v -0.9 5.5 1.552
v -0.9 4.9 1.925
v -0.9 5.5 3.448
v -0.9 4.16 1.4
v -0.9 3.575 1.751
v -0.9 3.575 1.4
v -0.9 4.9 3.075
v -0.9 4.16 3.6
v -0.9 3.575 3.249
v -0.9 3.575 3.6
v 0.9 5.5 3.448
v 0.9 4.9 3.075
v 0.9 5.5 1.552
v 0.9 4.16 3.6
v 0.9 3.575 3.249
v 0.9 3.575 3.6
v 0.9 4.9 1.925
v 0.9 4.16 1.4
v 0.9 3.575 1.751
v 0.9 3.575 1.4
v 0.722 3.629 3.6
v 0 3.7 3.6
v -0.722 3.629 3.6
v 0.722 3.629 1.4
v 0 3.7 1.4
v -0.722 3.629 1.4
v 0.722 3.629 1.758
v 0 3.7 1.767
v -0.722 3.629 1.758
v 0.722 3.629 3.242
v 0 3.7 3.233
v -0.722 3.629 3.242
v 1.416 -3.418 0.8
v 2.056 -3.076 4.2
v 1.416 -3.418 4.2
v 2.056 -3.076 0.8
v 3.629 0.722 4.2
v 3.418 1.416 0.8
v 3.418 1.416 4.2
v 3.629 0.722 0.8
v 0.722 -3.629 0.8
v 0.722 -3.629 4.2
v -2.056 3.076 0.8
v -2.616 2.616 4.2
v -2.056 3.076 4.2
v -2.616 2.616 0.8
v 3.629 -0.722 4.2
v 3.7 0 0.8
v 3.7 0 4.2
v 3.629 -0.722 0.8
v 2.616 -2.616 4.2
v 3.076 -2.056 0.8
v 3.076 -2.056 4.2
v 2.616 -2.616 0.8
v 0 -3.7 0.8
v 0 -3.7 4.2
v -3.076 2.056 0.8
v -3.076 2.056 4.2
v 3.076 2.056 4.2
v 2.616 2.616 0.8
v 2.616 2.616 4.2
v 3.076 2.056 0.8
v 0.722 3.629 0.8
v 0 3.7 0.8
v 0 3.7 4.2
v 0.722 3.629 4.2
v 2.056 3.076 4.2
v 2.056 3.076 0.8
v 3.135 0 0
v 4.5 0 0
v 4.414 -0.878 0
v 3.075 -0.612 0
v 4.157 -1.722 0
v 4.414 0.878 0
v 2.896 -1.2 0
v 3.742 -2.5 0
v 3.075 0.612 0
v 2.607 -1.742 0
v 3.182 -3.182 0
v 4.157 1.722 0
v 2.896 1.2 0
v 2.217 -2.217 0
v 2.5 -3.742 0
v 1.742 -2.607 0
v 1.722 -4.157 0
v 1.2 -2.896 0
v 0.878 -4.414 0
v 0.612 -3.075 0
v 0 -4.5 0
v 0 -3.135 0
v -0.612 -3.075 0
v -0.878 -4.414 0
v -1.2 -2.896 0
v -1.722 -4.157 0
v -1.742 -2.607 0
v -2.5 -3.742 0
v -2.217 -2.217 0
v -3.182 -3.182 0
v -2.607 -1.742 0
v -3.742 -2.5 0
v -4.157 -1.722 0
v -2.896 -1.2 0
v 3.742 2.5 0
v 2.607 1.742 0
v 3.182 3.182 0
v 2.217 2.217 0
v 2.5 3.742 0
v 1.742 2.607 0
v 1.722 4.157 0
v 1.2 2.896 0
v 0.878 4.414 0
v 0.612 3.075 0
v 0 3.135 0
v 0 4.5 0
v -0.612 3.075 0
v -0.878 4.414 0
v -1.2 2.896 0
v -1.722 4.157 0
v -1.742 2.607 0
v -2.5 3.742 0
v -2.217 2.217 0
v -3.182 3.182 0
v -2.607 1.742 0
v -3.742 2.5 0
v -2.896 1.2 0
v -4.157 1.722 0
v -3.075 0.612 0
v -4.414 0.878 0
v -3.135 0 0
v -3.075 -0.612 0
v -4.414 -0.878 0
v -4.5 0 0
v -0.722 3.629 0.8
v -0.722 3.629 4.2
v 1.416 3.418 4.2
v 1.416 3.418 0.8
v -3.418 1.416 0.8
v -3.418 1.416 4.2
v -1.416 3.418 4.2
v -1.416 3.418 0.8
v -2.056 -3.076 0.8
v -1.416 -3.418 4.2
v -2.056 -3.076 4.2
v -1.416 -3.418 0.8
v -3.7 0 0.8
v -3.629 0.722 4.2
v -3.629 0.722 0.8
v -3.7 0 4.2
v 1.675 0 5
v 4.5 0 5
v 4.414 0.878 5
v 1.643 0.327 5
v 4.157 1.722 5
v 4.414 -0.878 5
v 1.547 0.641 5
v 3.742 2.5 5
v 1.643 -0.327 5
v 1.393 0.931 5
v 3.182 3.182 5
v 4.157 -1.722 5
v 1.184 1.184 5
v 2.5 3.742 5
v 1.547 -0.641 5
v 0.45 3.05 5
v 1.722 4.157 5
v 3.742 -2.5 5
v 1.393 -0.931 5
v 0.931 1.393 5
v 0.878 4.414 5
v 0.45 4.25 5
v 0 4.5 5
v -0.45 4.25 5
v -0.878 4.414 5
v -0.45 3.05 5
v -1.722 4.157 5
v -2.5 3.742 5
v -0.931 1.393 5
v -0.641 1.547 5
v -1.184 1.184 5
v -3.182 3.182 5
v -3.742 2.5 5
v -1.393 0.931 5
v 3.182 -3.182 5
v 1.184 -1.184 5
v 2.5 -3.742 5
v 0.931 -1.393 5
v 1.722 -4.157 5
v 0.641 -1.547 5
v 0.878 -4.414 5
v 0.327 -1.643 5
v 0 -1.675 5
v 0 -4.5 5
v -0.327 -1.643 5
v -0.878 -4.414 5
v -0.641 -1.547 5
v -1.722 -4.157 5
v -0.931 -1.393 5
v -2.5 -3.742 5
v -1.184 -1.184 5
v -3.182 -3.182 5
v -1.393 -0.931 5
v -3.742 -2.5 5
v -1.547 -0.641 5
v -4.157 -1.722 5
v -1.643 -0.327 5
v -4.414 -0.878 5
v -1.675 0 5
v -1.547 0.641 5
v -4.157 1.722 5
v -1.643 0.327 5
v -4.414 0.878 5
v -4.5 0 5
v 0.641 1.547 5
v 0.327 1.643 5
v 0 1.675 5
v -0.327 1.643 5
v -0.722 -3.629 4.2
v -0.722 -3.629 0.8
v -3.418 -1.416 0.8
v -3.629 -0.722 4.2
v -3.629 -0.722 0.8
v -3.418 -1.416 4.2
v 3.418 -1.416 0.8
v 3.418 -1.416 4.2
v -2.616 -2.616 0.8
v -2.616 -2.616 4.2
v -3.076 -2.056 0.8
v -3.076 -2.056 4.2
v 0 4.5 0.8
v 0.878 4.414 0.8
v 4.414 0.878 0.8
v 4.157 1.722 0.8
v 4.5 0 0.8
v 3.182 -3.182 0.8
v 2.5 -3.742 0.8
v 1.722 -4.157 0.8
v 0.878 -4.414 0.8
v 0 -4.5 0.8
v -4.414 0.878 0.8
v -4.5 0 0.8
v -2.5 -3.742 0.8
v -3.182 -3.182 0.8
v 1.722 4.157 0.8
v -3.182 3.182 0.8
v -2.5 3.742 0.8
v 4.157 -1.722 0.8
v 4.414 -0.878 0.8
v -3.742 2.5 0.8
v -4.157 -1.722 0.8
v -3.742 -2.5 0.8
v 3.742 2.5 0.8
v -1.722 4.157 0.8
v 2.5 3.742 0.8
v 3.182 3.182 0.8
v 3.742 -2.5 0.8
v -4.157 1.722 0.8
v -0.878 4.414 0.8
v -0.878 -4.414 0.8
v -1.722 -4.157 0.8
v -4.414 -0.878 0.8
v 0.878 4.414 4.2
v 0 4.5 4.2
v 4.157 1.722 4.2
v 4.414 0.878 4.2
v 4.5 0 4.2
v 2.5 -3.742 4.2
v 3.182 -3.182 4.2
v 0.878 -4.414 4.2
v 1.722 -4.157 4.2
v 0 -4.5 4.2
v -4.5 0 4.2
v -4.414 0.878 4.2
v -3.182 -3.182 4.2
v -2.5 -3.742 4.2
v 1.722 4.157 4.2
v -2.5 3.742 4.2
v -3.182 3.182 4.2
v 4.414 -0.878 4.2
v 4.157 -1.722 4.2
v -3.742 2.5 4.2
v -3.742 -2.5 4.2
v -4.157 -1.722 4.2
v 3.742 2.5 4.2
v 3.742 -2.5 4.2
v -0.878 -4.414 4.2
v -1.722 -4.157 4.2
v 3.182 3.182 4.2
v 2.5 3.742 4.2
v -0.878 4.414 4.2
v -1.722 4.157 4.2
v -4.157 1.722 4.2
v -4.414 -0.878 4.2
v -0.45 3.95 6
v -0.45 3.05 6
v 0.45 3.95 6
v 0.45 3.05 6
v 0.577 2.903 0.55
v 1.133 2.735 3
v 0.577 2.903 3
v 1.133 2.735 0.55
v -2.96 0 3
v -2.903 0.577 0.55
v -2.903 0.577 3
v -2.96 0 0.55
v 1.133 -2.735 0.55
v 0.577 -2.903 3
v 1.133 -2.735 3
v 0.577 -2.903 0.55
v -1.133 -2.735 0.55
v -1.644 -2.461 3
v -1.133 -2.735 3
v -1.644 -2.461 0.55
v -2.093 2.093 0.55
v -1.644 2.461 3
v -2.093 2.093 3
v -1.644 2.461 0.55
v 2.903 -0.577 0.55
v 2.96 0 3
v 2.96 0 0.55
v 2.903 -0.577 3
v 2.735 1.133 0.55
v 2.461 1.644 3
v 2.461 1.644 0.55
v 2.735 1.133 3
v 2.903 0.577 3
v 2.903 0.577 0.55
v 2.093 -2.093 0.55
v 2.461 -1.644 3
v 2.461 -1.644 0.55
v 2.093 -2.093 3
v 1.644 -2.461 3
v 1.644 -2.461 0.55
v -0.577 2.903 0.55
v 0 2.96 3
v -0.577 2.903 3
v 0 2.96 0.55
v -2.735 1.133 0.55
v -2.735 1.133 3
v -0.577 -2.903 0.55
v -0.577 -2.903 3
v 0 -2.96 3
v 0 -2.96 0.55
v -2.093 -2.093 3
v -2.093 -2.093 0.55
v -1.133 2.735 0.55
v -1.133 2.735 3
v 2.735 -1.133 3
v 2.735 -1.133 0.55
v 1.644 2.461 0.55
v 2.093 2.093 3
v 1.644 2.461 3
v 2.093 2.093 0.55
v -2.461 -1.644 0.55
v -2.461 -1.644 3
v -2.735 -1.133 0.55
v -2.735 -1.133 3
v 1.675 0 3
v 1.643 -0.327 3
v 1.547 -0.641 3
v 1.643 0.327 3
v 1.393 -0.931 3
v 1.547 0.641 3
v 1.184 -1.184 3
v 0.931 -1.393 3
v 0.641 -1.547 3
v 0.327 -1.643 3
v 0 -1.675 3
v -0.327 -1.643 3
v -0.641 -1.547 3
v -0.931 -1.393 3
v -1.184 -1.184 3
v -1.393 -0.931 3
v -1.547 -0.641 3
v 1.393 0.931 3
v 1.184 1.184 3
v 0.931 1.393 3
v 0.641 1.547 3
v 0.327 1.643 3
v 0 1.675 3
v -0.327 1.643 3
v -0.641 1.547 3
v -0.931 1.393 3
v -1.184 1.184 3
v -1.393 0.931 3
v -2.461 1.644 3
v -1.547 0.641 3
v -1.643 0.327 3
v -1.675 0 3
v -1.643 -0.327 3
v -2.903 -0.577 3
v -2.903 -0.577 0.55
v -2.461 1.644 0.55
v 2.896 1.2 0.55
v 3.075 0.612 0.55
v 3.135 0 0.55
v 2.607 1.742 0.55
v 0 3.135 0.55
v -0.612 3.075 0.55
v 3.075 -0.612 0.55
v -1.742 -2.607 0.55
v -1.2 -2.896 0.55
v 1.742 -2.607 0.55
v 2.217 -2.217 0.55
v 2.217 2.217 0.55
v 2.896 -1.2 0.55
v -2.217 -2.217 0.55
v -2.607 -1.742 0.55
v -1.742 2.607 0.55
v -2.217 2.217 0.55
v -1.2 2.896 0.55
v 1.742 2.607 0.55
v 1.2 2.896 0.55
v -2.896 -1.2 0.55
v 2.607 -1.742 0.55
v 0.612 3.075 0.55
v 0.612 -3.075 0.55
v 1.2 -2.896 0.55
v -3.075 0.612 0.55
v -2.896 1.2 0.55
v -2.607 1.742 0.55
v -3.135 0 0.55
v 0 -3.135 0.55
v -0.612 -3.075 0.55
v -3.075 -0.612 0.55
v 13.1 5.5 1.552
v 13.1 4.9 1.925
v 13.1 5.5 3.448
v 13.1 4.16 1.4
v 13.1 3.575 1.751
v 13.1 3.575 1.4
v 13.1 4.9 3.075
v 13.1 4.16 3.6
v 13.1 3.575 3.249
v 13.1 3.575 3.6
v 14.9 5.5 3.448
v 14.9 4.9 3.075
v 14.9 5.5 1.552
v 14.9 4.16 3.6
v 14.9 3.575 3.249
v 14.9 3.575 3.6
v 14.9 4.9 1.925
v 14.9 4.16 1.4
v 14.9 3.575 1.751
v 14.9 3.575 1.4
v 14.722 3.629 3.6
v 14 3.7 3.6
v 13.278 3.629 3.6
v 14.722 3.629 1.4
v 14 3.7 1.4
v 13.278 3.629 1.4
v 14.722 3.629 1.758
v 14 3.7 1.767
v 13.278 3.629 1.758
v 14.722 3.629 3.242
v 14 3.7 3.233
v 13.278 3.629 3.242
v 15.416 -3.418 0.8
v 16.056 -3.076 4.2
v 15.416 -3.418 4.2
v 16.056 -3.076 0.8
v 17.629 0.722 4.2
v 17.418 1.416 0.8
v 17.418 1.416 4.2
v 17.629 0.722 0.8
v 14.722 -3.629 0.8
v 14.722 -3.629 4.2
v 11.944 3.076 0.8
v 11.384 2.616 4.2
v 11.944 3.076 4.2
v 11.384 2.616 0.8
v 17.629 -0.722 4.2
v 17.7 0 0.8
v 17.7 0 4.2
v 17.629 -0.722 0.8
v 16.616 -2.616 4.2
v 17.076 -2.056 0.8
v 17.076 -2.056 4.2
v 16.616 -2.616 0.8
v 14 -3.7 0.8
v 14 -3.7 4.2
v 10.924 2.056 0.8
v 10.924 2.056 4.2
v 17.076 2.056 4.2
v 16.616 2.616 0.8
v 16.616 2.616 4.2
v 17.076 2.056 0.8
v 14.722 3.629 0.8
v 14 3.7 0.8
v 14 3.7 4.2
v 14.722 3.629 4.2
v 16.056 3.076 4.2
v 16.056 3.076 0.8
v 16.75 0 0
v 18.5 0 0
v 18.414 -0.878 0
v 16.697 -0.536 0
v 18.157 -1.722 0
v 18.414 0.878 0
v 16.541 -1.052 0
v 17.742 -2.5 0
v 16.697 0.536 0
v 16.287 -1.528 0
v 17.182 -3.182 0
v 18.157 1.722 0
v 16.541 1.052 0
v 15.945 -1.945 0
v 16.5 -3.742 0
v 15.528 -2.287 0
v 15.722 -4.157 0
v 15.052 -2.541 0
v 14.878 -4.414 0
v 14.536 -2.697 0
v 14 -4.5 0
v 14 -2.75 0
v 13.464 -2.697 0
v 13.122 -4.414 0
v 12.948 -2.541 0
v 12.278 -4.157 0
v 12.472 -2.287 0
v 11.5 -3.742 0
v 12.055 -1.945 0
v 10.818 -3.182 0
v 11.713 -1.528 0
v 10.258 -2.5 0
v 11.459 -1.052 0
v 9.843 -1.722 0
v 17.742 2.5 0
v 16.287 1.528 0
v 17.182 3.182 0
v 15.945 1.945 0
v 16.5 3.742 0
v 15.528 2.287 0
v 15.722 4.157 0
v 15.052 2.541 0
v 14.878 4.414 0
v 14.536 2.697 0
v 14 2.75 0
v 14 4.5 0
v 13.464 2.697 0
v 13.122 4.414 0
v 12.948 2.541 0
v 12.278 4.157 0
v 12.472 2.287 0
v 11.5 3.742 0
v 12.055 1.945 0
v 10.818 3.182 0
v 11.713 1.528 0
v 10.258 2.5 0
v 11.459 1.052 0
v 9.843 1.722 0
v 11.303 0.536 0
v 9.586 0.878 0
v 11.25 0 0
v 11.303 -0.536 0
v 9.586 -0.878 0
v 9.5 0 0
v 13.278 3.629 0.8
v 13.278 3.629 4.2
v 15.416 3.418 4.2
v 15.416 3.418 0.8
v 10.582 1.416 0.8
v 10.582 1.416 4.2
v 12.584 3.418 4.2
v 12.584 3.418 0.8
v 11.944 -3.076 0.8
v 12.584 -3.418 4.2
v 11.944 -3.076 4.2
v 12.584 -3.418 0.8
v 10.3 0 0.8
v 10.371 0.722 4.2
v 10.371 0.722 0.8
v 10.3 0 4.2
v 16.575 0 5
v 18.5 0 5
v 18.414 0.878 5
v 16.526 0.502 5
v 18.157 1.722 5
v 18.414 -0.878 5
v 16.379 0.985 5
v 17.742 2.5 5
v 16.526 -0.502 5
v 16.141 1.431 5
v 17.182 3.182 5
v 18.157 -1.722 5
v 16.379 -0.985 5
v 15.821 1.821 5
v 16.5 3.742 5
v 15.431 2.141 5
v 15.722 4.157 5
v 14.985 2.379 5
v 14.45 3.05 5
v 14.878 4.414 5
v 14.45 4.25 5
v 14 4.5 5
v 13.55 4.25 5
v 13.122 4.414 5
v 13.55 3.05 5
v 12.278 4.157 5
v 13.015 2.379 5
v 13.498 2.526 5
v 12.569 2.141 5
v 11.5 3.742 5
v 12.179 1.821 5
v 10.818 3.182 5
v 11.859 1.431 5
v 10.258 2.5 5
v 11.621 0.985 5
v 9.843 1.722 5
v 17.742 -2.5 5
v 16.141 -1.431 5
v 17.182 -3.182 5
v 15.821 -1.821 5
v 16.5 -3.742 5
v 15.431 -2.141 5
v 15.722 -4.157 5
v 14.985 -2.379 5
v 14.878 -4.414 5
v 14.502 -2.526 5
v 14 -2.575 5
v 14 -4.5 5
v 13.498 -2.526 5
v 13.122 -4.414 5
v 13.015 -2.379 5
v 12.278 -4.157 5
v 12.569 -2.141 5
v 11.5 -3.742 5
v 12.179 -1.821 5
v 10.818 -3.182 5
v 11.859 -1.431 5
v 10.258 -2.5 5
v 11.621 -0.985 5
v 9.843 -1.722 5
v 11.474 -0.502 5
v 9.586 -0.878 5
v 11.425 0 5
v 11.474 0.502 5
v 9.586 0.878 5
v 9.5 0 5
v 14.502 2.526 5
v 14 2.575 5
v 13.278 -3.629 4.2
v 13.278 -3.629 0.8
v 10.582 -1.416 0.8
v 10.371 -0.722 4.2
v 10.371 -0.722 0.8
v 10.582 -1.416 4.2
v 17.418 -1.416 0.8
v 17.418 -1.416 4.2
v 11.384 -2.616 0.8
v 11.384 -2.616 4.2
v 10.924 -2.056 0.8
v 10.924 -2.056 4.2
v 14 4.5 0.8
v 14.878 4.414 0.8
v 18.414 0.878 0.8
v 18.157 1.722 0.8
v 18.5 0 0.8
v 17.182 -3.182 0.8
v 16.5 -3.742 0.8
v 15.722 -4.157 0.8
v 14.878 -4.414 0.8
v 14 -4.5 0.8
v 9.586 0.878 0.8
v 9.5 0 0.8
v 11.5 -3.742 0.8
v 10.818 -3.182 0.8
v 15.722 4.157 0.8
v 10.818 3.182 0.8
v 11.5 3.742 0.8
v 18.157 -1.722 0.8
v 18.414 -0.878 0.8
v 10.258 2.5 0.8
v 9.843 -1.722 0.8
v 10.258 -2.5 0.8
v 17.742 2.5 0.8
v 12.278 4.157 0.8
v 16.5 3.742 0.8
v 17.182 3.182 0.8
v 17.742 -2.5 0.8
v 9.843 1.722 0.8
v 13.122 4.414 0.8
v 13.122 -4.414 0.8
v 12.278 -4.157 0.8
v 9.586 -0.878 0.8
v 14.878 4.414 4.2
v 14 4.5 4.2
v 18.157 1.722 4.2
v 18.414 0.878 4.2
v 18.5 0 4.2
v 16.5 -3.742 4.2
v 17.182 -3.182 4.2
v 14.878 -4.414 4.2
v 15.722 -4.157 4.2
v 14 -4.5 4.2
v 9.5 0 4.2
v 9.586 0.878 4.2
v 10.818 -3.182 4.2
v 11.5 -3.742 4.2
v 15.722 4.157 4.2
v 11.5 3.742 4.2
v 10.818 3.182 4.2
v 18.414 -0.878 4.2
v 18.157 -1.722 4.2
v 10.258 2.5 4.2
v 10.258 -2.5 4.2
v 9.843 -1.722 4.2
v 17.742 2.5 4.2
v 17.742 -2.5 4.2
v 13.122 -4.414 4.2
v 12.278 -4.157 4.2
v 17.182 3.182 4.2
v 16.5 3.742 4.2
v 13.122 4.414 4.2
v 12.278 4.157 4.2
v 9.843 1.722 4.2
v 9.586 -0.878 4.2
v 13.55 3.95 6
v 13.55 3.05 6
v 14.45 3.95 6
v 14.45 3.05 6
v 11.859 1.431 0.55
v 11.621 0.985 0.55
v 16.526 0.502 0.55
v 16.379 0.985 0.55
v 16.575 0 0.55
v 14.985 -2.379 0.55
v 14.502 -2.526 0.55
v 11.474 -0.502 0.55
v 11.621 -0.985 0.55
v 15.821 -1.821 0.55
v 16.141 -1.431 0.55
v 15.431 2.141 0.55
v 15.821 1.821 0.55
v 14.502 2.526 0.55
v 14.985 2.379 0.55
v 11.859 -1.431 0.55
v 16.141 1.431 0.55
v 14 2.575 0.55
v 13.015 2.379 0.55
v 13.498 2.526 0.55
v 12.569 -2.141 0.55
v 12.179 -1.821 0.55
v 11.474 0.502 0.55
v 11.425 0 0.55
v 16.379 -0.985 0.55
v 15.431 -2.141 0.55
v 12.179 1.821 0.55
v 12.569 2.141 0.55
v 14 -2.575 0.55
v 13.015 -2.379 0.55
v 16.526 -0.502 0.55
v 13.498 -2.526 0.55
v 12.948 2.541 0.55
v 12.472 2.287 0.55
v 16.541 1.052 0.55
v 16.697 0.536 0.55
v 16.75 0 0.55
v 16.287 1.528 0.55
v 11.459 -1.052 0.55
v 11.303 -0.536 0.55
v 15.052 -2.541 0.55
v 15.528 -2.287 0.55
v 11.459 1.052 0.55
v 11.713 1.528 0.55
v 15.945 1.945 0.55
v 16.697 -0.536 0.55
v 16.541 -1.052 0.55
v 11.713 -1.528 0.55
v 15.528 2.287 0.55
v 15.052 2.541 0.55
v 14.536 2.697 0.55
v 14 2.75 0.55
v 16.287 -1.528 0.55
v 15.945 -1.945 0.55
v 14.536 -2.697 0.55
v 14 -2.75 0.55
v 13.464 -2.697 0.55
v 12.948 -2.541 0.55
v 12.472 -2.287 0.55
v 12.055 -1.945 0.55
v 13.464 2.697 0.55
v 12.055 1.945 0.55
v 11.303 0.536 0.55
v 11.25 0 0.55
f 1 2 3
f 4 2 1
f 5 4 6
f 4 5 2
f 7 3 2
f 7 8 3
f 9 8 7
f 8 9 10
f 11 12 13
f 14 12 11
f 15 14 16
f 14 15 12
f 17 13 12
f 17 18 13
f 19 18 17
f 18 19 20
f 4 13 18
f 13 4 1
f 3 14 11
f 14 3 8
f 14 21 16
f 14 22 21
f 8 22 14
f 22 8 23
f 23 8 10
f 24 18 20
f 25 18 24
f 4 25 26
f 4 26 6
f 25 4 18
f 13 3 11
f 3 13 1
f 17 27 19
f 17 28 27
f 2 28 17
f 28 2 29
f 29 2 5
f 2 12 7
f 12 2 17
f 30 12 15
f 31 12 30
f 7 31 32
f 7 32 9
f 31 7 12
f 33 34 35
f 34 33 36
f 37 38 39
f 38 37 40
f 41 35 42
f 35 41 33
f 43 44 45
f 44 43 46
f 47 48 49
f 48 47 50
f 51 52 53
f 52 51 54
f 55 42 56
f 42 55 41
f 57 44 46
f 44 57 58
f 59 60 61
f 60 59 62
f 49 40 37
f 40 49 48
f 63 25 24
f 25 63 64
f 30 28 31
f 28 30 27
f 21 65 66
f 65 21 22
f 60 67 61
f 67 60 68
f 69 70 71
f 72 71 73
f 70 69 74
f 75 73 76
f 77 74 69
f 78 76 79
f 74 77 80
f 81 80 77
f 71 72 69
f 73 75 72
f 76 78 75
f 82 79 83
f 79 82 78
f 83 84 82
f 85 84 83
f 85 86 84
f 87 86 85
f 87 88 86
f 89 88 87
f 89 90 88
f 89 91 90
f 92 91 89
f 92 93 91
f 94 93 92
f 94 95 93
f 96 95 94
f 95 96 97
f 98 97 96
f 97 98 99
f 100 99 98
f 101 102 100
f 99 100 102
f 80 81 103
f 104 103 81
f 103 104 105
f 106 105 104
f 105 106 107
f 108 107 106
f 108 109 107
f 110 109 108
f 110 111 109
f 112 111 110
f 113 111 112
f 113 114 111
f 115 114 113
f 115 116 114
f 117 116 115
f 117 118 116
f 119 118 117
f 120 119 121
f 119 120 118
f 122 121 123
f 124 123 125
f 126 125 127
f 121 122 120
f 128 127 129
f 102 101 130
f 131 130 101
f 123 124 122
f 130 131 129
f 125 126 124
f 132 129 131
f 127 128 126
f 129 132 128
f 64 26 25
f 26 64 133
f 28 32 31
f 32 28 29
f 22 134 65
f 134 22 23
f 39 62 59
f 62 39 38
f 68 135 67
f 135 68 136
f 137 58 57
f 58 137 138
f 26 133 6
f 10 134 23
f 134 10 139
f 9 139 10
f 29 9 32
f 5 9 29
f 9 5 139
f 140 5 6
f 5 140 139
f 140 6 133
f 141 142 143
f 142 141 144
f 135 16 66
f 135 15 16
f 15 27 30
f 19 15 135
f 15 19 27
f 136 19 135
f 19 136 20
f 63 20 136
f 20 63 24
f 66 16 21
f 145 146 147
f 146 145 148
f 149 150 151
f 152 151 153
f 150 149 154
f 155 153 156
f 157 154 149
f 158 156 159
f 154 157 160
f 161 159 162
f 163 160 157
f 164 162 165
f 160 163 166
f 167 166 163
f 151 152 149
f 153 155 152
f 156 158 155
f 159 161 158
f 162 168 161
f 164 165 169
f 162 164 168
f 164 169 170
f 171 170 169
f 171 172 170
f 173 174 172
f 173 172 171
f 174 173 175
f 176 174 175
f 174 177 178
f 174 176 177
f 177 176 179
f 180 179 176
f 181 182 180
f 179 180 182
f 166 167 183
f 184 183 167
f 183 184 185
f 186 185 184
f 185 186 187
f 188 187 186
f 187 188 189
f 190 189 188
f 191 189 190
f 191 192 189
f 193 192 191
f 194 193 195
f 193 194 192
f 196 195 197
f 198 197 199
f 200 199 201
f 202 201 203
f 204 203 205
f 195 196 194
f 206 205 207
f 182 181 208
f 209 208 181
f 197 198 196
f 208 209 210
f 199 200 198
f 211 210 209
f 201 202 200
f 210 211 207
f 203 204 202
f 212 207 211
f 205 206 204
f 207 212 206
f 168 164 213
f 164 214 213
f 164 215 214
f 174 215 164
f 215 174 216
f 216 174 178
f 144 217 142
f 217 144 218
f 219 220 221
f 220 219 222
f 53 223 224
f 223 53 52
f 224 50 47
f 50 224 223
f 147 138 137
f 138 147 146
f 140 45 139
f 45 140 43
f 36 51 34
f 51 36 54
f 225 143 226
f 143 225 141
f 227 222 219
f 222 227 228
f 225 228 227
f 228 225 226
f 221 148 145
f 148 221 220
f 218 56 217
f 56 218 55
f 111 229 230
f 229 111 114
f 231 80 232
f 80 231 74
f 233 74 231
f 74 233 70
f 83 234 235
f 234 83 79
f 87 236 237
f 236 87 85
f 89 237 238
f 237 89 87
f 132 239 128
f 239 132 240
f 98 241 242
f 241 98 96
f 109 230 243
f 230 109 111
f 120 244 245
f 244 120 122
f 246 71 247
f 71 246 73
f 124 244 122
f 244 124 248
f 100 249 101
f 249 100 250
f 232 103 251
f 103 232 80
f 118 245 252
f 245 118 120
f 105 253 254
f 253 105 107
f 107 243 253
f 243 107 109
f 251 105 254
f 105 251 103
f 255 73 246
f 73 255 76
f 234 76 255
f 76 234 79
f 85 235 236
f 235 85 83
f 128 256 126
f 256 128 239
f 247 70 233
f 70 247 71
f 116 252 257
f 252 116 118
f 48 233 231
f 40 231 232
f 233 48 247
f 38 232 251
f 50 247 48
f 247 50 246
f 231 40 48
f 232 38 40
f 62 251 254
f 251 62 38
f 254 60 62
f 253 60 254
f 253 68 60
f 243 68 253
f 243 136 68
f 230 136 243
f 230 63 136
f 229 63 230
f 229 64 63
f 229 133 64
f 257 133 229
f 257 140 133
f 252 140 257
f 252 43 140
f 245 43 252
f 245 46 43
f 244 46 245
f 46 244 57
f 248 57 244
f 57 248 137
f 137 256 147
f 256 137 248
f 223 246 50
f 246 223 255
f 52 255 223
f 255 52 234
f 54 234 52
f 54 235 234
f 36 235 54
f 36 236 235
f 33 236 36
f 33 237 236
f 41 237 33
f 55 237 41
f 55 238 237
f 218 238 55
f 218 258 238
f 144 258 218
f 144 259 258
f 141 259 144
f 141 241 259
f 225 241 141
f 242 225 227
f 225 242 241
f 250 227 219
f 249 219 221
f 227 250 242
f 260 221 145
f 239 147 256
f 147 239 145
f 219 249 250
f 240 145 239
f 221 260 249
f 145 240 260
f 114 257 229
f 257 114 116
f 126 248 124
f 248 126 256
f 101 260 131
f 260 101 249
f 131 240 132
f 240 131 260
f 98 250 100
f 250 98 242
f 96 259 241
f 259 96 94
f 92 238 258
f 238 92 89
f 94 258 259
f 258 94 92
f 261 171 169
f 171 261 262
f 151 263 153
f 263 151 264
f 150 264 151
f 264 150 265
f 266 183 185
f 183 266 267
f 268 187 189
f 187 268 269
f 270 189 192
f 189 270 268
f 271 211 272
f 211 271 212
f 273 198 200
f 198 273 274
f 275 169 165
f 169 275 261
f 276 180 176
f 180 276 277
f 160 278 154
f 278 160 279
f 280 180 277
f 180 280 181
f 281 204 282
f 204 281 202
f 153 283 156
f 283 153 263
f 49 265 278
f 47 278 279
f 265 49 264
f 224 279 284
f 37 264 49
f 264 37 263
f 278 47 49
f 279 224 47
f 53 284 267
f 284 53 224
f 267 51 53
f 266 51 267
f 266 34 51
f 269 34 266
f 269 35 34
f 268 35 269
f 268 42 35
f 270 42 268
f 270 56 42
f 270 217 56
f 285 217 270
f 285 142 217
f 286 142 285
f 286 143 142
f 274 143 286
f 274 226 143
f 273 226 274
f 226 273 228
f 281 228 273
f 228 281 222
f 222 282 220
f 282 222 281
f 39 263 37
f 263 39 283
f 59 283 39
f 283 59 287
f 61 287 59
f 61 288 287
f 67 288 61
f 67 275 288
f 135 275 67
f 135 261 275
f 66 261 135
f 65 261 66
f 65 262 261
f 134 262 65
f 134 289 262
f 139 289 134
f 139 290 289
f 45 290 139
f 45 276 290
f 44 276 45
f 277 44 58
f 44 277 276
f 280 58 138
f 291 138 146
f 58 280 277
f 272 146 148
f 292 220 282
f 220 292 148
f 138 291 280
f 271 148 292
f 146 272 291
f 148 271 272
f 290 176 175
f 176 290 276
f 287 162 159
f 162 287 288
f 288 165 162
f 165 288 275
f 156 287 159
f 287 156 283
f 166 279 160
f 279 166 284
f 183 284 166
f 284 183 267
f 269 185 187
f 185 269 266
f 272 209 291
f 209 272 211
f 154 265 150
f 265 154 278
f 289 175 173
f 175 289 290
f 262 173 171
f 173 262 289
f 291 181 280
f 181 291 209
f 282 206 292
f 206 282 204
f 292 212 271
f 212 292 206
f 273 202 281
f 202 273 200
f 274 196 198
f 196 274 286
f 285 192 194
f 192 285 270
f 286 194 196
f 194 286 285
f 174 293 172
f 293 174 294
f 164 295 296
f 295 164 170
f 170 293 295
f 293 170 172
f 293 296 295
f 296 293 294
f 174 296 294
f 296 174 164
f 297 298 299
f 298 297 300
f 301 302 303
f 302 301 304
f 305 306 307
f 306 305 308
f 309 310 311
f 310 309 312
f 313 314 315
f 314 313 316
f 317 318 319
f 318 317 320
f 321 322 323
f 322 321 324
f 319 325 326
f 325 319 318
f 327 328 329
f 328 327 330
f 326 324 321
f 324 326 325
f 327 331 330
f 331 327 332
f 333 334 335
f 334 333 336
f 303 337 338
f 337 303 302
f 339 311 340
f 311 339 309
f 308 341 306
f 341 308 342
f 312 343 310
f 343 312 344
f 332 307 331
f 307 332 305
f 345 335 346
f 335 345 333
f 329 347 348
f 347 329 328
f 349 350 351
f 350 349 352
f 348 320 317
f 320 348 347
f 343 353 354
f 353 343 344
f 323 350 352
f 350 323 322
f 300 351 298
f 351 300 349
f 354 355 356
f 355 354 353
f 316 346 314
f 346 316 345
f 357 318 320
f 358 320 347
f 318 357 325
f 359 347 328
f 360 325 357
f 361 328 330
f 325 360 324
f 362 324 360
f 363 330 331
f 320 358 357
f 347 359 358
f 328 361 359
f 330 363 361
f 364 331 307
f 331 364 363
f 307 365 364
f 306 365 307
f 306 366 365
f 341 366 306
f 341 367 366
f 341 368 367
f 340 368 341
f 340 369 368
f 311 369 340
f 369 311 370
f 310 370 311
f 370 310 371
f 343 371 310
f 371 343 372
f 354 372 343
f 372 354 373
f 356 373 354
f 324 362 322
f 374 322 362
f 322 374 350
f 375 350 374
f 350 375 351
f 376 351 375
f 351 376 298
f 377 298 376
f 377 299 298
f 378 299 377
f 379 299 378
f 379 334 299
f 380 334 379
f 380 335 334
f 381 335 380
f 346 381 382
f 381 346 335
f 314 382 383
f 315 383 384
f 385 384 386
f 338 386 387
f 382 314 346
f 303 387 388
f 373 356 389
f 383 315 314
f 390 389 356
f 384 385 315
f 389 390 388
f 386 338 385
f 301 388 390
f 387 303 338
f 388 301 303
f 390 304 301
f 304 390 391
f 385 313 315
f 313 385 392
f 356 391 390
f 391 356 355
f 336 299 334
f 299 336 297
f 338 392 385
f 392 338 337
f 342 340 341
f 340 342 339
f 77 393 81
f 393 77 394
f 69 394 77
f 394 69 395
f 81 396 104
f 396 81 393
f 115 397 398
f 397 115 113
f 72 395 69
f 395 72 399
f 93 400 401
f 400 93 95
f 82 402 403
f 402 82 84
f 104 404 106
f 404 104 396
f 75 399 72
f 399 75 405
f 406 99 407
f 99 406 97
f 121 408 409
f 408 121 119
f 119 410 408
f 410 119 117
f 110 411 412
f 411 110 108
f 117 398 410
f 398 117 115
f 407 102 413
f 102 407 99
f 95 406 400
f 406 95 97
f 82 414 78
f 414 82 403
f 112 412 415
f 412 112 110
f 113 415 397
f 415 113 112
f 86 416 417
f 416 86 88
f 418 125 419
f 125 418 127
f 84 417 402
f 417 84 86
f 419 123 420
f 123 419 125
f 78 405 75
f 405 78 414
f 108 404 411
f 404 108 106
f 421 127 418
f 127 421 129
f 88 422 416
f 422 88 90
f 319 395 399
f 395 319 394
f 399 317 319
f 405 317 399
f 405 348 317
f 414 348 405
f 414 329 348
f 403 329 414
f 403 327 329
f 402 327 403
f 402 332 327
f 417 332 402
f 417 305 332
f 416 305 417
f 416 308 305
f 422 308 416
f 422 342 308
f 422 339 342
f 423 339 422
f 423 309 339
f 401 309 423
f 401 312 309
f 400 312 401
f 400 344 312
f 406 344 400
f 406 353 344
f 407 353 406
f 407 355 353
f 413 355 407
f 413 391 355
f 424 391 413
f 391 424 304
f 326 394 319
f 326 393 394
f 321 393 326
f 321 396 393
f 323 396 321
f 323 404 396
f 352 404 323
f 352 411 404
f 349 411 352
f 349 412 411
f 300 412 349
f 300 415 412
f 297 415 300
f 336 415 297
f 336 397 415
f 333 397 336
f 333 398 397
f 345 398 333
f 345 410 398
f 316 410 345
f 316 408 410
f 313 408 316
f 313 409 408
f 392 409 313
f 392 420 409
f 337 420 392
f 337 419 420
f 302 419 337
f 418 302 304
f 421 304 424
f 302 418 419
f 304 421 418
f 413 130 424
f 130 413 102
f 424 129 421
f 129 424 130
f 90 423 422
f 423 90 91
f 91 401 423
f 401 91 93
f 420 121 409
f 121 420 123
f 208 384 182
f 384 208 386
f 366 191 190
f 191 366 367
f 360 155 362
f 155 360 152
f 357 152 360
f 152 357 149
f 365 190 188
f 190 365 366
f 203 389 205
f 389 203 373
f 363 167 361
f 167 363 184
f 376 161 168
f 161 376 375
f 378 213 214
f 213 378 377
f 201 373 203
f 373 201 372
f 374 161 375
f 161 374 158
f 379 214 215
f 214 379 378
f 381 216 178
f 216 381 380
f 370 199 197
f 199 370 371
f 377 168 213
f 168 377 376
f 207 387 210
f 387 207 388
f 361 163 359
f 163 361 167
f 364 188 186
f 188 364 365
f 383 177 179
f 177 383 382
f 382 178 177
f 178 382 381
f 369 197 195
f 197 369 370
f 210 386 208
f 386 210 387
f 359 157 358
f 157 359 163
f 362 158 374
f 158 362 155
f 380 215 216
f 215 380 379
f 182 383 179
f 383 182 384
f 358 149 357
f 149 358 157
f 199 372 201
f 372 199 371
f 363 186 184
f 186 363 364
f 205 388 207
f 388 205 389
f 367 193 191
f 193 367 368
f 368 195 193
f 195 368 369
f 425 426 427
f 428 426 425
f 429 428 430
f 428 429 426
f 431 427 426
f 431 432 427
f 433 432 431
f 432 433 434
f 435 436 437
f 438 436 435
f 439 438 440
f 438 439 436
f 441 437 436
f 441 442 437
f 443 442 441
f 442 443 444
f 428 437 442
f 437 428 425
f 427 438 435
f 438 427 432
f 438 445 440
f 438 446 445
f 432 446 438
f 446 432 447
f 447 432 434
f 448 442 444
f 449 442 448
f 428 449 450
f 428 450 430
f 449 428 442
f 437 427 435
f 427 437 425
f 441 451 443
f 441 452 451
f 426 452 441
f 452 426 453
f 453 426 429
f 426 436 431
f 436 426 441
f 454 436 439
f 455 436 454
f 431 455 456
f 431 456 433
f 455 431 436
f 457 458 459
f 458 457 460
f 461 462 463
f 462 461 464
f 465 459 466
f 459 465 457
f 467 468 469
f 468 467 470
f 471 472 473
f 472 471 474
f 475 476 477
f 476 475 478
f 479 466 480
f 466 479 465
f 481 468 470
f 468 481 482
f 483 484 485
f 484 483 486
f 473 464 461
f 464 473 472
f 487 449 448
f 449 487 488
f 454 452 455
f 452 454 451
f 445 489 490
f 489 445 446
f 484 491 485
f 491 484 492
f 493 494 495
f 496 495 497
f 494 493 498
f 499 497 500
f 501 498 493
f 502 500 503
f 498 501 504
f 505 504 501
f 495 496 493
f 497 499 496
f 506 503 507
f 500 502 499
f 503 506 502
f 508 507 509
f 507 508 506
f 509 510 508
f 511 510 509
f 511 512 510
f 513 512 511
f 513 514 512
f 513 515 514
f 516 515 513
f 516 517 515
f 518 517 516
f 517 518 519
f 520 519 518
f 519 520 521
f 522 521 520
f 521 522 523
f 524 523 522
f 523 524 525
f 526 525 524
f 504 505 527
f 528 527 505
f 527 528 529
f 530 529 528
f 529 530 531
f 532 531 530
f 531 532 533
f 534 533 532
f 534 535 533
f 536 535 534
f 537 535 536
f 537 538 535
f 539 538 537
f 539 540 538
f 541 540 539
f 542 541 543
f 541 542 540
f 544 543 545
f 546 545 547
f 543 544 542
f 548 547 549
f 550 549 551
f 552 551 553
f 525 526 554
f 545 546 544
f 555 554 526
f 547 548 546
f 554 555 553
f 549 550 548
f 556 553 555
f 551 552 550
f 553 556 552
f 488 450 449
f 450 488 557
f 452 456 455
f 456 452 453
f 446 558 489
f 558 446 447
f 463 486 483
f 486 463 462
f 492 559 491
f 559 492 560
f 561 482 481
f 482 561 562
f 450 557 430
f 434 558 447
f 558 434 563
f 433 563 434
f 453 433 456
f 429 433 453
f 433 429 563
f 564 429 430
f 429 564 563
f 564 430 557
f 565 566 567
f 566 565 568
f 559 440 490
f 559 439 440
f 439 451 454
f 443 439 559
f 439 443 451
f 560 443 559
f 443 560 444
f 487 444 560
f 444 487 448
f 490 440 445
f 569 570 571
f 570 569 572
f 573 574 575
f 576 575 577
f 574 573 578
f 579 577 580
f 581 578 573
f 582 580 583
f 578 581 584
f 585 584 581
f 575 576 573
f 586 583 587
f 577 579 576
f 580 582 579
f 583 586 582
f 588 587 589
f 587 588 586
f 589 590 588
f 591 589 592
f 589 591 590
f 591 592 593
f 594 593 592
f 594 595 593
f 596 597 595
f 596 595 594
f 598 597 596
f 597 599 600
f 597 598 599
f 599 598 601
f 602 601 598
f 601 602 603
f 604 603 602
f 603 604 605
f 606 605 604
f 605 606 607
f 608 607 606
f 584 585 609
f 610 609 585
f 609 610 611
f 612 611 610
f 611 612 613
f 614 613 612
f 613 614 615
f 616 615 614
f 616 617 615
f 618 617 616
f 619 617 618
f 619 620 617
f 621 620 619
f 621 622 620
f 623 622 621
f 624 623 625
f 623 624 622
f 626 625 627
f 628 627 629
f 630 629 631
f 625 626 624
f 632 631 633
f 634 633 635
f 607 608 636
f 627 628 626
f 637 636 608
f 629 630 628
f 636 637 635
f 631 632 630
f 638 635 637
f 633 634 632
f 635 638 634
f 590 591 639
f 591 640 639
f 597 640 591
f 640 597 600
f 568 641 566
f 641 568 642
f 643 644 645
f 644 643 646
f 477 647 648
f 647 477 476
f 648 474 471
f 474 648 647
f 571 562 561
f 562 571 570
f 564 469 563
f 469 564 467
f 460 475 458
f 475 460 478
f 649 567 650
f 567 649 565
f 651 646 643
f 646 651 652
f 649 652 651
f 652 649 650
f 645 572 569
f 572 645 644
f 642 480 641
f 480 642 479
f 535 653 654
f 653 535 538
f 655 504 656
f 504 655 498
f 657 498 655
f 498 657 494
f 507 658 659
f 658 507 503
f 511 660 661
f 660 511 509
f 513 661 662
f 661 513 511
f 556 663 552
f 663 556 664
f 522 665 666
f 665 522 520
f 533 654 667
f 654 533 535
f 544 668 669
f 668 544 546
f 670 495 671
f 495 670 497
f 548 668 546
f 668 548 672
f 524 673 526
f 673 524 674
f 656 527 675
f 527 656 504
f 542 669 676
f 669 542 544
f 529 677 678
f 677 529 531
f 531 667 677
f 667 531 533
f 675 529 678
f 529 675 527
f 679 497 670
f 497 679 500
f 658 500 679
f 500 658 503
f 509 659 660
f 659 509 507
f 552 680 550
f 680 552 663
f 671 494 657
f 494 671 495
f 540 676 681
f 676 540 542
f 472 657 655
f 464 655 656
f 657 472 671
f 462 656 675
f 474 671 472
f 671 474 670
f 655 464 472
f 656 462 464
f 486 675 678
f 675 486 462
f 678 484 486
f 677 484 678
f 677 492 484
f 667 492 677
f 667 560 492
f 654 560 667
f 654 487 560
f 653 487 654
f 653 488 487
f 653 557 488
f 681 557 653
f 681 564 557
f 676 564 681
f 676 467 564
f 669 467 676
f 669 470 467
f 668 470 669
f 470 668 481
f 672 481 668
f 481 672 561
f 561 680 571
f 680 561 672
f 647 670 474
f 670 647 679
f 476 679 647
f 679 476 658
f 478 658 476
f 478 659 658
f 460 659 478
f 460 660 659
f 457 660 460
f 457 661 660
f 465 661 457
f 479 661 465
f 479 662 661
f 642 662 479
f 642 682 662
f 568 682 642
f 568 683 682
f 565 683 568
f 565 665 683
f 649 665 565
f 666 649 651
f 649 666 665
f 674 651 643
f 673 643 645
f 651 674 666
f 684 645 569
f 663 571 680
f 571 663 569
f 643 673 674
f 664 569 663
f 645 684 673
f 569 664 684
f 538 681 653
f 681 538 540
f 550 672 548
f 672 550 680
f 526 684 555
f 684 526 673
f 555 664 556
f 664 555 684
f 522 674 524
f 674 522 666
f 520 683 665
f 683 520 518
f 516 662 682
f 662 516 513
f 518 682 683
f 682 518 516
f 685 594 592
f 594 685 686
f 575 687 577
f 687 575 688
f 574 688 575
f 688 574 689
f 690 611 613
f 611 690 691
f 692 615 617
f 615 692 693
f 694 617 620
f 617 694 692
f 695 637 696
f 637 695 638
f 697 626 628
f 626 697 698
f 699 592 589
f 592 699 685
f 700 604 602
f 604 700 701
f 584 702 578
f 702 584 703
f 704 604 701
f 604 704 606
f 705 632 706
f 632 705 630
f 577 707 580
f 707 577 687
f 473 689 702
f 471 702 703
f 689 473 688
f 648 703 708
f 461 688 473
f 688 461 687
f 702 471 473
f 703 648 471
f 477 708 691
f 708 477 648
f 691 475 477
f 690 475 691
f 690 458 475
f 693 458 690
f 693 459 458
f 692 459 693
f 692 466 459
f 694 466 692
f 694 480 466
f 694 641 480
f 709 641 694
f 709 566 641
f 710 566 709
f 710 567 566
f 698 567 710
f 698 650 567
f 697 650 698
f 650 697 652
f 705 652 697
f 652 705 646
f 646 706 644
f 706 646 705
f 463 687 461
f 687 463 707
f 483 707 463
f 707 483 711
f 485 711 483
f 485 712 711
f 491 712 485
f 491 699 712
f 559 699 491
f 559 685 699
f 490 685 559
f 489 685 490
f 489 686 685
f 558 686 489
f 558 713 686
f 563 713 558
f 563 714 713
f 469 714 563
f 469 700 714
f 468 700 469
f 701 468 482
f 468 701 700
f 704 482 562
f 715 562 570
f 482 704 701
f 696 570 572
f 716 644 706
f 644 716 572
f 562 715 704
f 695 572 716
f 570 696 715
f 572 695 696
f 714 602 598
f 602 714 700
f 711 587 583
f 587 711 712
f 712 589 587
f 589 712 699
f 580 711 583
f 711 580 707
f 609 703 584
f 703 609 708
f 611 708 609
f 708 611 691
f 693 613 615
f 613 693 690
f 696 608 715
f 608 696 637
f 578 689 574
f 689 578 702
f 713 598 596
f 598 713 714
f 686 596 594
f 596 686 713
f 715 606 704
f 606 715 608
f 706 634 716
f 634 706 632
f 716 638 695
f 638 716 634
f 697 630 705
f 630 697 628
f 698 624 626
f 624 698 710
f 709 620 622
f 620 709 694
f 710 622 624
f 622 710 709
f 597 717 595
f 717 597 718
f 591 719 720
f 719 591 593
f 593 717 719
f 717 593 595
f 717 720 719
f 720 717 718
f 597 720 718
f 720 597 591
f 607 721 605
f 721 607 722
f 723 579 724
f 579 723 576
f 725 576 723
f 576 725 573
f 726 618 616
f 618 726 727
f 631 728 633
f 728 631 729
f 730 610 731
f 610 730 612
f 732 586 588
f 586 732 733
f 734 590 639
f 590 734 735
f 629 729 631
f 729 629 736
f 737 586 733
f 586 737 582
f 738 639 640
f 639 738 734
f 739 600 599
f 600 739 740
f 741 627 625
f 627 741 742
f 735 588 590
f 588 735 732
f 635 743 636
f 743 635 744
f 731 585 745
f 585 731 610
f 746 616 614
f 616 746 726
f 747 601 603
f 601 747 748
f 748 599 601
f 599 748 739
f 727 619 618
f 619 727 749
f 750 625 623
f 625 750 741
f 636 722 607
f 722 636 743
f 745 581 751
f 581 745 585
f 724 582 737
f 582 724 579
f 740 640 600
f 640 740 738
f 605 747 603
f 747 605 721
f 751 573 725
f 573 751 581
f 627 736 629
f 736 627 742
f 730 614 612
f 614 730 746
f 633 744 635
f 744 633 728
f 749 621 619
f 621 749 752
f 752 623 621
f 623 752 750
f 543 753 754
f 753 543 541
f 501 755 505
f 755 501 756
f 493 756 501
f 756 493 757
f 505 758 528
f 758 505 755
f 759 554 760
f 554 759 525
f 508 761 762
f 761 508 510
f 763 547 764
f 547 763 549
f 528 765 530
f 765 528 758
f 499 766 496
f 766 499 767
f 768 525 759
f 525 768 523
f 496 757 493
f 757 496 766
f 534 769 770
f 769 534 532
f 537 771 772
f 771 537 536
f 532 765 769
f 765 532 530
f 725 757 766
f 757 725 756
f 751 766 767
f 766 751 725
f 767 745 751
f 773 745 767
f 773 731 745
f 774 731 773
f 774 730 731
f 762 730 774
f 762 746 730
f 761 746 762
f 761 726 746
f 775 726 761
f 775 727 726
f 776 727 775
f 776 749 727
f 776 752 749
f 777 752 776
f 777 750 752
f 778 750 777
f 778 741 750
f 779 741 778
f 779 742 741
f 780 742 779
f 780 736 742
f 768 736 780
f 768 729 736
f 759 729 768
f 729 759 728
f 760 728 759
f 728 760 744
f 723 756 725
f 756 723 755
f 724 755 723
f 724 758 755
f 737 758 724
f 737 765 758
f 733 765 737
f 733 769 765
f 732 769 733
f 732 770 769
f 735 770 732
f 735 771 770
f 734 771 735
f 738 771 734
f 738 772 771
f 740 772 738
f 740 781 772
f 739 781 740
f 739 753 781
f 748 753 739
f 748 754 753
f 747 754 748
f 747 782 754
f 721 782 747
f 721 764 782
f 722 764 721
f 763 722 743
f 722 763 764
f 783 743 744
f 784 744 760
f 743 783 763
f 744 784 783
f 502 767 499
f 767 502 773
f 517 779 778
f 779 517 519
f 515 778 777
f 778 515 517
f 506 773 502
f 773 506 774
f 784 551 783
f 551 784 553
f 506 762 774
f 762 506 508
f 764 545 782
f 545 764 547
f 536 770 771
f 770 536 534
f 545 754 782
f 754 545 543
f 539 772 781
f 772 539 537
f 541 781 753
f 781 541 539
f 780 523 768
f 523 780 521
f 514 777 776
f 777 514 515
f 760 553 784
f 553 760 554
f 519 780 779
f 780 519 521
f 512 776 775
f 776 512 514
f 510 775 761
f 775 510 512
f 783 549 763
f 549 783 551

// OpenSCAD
// DOUBLE TAKE FRAMES DESIGN RELEASE
// DTF_RELEASE: 1.0.0
// Released: 2026-08-30
// Versioning: Semantic Versioning 2.0.0 (https://semver.org/)
// Status: CANONICAL
// Changes in 1.0.0:
// - Initial versioned public design release.
// - Establishes the current accepted geometry as the 1.x compatibility baseline.
// Full release notes: https://doubletakeframes.com/build/#design-release
//
// Young Town / 12888-style CANON capstan pair.
// Minute remains canon at 3.58 mm. Hour is now a candidate set.
//
//   MINUTE capstan: 3.58 mm top bore
//   HOUR candidates: 5.15 mm straight bore
//
// This file renders one minute capstan plus hour candidates.
//
// Intended stack model:
// - top smaller rotating post = minute output
// - middle larger sleeve = hour output
// - bottom collar/boss = stationary guide, avoid clamping it
//
// Both capstans use:
// - flipped-trapezoid string eyelet on +Y
// - top indicator horn / gnomon also on +Y, aligned with the string eyelet/thread hole
// - geometry tuned for 0.4 mm nozzle and fishing line

$fn = 32;
eps = 0.05;

// ---------- selected fits ----------

minute_bore_d = 3.35;          // selected minute fit
hour_bores    = [5.15];        // current hour candidate/canon

minute_lower_clearance_d = 5.92;   // clears large/snap-family hour sleeve
minute_tight_bore_h      = 2.0;    // upper grip length on minute post

// ---------- capstan geometry ----------

total_h  = 5.0;
flange_h = 0.80;

drum_d   = 7.4;
flange_d = 9.0;

// small bottom-only flare to forgive first-layer roughness
bore_mouth_extra = 0.35;
bore_mouth_h     = 0.55;

// pair layout
part_spacing_x = 14;

// ---------- string eyelet geometry ----------

string_eyelet_enabled = true;

// required clearance from top/bottom flange faces
string_eyelet_flange_gap_z = 0.60;

// width around the capstan circumference
string_eyelet_w_x = 1.8;

// overlap into drum for fusion
string_eyelet_drum_overlap_y = 0.20;

// protrusion beyond flange radius; keep small for boss-guide clearance
string_eyelet_beyond_flange_y = 1.2;

// flipped trapezoid: tall face at drum, shorter face outside
// Slightly taller than prior version to open the thread hole.
string_eyelet_inner_face_h_z = 2.35;
string_eyelet_outer_face_h_z = 1.85;

// printable walls around eyelet void
// Reduced cautiously for easier threading with fishing line.
string_eyelet_wall_z = 0.35;
string_eyelet_outer_wall_y = 0.8;

// lets void reach cleanly to drum-side of eyelet without cutting actual drum
string_eyelet_void_inset_y = 0.70;

// ---------- top indicator horn ----------

indicator_horn_enabled = true;

// Horn is now aligned with the +Y string eyelet/thread hole.
// It lives on the top rim in the same radial direction as the eyelet.
indicator_horn_inner_y = 3.05;
indicator_horn_outer_y = 4.25;
indicator_horn_w_x     = 0.90;
indicator_horn_h_z     = 1.00;
indicator_horn_taper_y = 0.30;


// ---------- helpers ----------

module cyl(d, h, z=0) {
    translate([0,0,z])
        cylinder(d=d, h=h);
}

// Prism extruded along X from a 2D Y/Z polygon.
// points_yz must be ordered around the polygon perimeter.
module prism_x(points_yz, w_x) {
    n = len(points_yz);

    polyhedron(
        points = concat(
            [for (p = points_yz) [-w_x/2, p[0], p[1]]],
            [for (p = points_yz) [ w_x/2, p[0], p[1]]]
        ),
        faces = concat(
            [[for (i = [n-1:-1:0]) i]],
            [[for (i = [0:n-1]) i + n]],
            [for (i = [0:n-1])
                [i, (i + 1) % n, ((i + 1) % n) + n, i + n]
            ]
        )
    );
}


// ---------- top indicator horn ----------

module top_indicator_horn() {
    if (indicator_horn_enabled) {
        // Thin vertical fin / gnomon on the top flange rim.
        // Aligned with the +Y string eyelet/thread hole.
        prism_x(
            [
                [indicator_horn_inner_y, total_h],
                [indicator_horn_outer_y, total_h],
                [indicator_horn_outer_y - indicator_horn_taper_y, total_h + indicator_horn_h_z],
                [indicator_horn_inner_y, total_h + indicator_horn_h_z]
            ],
            indicator_horn_w_x
        );
    }
}


// ---------- flipped trapezoid string eyelet ----------

function eyelet_channel_z0() =
    flange_h + string_eyelet_flange_gap_z;

function eyelet_channel_z1() =
    total_h - flange_h - string_eyelet_flange_gap_z;

function eyelet_mid_z() =
    total_h / 2;

function eyelet_inner_y() =
    drum_d/2 - string_eyelet_drum_overlap_y;

function eyelet_outer_y() =
    flange_d/2 + string_eyelet_beyond_flange_y;

function eyelet_inner_z0() =
    eyelet_mid_z() - string_eyelet_inner_face_h_z/2;

function eyelet_inner_z1() =
    eyelet_mid_z() + string_eyelet_inner_face_h_z/2;

function eyelet_outer_z0() =
    eyelet_mid_z() - string_eyelet_outer_face_h_z/2;

function eyelet_outer_z1() =
    eyelet_mid_z() + string_eyelet_outer_face_h_z/2;

function eyelet_void_inner_y() =
    drum_d/2 - string_eyelet_void_inset_y;

function eyelet_void_outer_y() =
    eyelet_outer_y() - string_eyelet_outer_wall_y;

function eyelet_void_inner_z0() =
    eyelet_inner_z0() + string_eyelet_wall_z;

function eyelet_void_inner_z1() =
    eyelet_inner_z1() - string_eyelet_wall_z;

function eyelet_void_outer_z0() =
    eyelet_outer_z0() + string_eyelet_wall_z;

function eyelet_void_outer_z1() =
    eyelet_outer_z1() - string_eyelet_wall_z;

module flipped_trapezoid_eyelet_solid_body() {
    intersection() {
        prism_x(
            [
                [eyelet_inner_y(), eyelet_inner_z0()],
                [eyelet_outer_y(), eyelet_outer_z0()],
                [eyelet_outer_y(), eyelet_outer_z1()],
                [eyelet_inner_y(), eyelet_inner_z1()]
            ],
            string_eyelet_w_x
        );

        // hard Z clip to keep eyelet between flange faces
        translate([0, 0, total_h/2])
            cube(
                [
                    flange_d + 2,
                    flange_d + 2,
                    eyelet_channel_z1() - eyelet_channel_z0()
                ],
                center=true
            );
    }
}

module flipped_trapezoid_eyelet_inner_polygon_void() {
    // Subtracted only from eyelet body, not from capstan/drum.
    prism_x(
        [
            [eyelet_void_inner_y(), eyelet_void_inner_z0()],
            [eyelet_void_outer_y(), eyelet_void_outer_z0()],
            [eyelet_void_outer_y(), eyelet_void_outer_z1()],
            [eyelet_void_inner_y(), eyelet_void_inner_z1()]
        ],
        string_eyelet_w_x + 2*eps
    );
}

module polygon_cut_flipped_trapezoid_eyelet() {
    difference() {
        flipped_trapezoid_eyelet_solid_body();
        flipped_trapezoid_eyelet_inner_polygon_void();
    }
}


// ---------- shared shell ----------

module capstan_shell() {
    union() {
        // center winding drum
        cyl(drum_d, total_h);

        // bottom retaining flange
        cyl(flange_d, flange_h);

        // top retaining flange
        cyl(flange_d, flange_h, total_h - flange_h);

        // string eyelet on +Y side
        if (string_eyelet_enabled)
            polygon_cut_flipped_trapezoid_eyelet();

        // top indicator horn aligned with +Y string eyelet
        top_indicator_horn();
    }
}


// ---------- final capstans ----------

module minute_capstan() {
    lower_h = total_h - minute_tight_bore_h;

    difference() {
        capstan_shell();

        // Lower clearance cavity over the hour sleeve.
        translate([0,0,-eps])
            cylinder(d=minute_lower_clearance_d, h=lower_h + eps);

        // Small bottom mouth easing.
        translate([0,0,-eps])
            cylinder(d=minute_lower_clearance_d + bore_mouth_extra, h=bore_mouth_h + eps);

        // Upper tight minute-shaft grip.
        translate([0,0,lower_h])
            cylinder(d=minute_bore_d, h=minute_tight_bore_h + eps);
    }
}

module hour_capstan(bore_d=5.15) {
    difference() {
        capstan_shell();

        // Straight hour-sleeve press-fit bore.
        translate([0,0,-eps])
            cylinder(d=bore_d, h=total_h + 2*eps);

        // Small bottom mouth easing.
        translate([0,0,-eps])
            cylinder(d=bore_d + bore_mouth_extra, h=bore_mouth_h + eps);
    }
}


// ---------- render minute + hour candidates ----------

// Leftmost: minute canon 3.58.
//translate([0, 0, 0])
    minute_capstan();

// Hour candidates.
for (i = [0:len(hour_bores)-1]) {
    translate([(i + 1) * part_spacing_x, 0, 0])
        hour_capstan(hour_bores[i]);
}
